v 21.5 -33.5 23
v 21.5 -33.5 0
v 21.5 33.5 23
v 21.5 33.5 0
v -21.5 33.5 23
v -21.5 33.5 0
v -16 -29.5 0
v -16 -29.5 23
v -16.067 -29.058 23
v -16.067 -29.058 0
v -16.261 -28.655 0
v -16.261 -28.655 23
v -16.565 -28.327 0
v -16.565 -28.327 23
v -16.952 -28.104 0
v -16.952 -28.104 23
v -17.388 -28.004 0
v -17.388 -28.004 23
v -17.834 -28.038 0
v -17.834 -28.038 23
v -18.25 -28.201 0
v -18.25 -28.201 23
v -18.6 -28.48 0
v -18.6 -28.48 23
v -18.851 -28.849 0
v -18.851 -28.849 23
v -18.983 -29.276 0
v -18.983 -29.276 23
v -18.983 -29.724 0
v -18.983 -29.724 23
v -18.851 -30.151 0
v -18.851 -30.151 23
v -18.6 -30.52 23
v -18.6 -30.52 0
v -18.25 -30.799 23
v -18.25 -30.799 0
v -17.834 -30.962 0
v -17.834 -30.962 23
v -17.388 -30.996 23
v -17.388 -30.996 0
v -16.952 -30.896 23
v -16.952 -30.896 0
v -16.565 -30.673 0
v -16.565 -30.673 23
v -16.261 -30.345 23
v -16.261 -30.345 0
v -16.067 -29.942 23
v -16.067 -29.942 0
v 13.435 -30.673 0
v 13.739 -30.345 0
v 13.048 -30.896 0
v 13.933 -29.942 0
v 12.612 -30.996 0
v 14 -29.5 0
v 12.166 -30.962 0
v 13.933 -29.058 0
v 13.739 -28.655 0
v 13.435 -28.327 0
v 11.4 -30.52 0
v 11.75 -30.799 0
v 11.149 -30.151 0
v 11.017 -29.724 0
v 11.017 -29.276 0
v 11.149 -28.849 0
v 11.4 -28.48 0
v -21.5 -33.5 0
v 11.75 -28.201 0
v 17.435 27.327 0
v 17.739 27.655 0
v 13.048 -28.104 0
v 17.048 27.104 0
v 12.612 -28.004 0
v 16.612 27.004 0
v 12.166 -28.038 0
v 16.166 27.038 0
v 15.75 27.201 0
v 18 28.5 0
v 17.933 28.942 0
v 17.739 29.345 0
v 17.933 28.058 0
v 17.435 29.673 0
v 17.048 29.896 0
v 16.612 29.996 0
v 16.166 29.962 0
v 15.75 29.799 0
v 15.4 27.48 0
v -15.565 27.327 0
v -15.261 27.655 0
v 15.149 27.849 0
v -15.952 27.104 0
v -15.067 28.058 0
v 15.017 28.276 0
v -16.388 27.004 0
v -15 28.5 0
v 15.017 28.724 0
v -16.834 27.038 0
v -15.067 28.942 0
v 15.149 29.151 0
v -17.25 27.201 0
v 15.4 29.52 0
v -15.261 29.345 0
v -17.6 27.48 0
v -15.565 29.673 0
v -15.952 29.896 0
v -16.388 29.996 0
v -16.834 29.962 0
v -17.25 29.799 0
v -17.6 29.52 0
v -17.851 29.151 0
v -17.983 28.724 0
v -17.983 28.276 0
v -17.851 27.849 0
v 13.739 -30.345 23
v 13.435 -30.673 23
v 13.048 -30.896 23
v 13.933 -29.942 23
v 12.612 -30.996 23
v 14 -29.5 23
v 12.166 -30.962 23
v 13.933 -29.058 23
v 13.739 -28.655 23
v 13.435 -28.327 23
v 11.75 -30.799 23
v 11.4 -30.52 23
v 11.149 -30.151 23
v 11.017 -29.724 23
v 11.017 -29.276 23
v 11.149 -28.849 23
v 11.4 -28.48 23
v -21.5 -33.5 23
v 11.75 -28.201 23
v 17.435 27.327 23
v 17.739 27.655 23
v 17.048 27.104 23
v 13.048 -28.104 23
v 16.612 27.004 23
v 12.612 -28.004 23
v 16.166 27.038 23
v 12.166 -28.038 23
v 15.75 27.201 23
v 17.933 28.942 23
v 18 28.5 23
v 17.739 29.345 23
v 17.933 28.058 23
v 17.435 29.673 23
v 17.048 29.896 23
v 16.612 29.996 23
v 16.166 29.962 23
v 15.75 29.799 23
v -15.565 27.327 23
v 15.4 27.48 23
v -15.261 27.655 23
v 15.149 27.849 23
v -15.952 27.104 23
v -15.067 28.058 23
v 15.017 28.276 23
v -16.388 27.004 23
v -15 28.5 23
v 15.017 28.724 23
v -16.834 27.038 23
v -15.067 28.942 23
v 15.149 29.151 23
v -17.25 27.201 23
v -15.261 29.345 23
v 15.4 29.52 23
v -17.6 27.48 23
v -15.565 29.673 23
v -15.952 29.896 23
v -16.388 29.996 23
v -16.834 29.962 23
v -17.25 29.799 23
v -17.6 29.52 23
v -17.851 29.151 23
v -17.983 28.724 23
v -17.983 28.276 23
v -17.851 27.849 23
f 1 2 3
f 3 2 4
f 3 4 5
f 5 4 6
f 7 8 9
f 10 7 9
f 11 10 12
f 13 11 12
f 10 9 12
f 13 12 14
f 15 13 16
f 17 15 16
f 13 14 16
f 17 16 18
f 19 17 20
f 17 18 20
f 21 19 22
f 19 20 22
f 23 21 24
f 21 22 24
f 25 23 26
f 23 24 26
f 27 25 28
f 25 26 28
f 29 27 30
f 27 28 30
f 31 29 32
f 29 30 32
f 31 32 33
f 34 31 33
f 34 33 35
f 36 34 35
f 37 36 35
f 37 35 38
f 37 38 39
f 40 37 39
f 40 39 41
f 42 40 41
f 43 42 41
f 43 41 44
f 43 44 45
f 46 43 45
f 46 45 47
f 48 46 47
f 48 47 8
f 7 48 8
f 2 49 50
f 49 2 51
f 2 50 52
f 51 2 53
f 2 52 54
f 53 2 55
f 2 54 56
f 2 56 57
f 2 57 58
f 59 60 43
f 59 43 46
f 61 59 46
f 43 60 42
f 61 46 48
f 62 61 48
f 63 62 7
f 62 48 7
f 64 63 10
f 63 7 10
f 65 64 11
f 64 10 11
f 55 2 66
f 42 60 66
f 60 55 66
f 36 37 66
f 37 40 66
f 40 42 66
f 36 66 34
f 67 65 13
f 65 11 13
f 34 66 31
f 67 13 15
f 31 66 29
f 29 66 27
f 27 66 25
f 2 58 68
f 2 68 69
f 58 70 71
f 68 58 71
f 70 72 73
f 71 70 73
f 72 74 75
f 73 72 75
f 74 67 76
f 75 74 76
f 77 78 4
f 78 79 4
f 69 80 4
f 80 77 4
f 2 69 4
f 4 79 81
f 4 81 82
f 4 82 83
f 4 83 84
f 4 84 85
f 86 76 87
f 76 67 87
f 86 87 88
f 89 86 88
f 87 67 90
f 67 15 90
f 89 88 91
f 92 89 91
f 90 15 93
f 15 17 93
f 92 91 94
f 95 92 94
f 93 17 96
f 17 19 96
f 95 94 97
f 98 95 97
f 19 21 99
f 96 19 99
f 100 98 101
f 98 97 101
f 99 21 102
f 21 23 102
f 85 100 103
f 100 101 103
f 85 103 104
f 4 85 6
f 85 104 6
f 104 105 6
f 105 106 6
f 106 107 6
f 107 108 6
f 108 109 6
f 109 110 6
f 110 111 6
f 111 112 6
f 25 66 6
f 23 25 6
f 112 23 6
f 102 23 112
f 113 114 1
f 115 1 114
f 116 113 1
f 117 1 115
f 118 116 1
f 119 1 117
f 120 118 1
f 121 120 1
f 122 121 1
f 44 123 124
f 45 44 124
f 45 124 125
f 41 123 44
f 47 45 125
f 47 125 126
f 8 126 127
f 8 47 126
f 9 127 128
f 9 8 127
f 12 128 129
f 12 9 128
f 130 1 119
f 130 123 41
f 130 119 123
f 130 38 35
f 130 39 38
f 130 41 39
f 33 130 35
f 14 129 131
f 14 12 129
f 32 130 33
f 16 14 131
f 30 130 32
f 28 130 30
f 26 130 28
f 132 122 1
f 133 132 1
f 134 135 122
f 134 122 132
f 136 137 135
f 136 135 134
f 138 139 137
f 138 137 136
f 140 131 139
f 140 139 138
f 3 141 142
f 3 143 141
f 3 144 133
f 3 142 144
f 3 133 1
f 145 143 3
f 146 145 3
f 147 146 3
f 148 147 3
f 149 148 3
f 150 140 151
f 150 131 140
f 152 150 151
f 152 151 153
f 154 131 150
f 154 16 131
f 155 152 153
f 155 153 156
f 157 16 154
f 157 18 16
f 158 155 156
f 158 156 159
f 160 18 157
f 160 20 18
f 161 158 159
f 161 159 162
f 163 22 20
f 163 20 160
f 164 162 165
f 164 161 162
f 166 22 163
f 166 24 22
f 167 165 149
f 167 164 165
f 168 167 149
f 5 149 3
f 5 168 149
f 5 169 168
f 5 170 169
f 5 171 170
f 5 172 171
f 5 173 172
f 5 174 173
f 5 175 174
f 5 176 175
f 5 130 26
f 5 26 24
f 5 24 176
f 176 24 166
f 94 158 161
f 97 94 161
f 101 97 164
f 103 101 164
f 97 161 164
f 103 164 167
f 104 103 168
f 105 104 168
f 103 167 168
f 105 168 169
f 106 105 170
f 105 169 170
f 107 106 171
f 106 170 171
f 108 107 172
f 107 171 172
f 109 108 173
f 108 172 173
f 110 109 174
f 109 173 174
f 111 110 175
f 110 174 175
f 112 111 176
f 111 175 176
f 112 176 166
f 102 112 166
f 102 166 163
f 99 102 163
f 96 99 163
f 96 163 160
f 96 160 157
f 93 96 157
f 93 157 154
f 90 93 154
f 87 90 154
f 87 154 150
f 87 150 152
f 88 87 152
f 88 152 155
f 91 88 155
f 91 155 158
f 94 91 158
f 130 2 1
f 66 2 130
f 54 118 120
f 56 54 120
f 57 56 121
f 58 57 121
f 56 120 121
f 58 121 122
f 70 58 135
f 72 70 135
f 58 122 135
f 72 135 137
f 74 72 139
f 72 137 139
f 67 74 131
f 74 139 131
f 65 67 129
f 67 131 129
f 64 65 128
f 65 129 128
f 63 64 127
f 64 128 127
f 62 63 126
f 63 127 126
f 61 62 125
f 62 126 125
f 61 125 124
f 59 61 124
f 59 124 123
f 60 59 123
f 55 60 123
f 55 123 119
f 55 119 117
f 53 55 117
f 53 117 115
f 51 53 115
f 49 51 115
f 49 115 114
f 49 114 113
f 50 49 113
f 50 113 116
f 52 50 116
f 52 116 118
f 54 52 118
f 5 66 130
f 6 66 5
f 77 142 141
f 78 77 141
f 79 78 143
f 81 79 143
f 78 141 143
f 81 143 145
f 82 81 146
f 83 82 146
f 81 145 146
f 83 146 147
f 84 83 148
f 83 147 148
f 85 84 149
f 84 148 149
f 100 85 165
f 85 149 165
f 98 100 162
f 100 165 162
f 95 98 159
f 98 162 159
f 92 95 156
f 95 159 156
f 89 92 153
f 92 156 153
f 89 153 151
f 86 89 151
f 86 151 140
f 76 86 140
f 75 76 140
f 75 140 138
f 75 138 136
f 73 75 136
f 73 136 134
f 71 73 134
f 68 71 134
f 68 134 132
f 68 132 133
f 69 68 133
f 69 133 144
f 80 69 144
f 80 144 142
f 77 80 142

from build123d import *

# Parameters (mm, degrees)
SKETCH1_W           = 67
SKETCH1_H           = 43
BOSS_EXTRUDE1_DEPTH = 23
CUT_EXTRUDE1_REACH  = 47.973
SKETCH2_R           = 1.5


with BuildPart() as part:
    # Sketch1 → Boss-Extrude1 (new body)
    with BuildSketch(Plane(origin=(0, 0, 0), x_dir=(0, 1, 0), z_dir=(0, 0, 1))):
        Rectangle(SKETCH1_W, SKETCH1_H)
    extrude(amount=BOSS_EXTRUDE1_DEPTH)

    # Sketch2 → Cut-Extrude1 (cut, up to next)
    with BuildSketch(Plane.XY.offset(23), mode=Mode.PRIVATE) as cut_extrude1_sk1:
        with Locations((-16.5, 28.5)):
            Circle(SKETCH2_R)
    cut_extrude1_tool1 = extrude(cut_extrude1_sk1.sketch, amount=-CUT_EXTRUDE1_REACH, mode=Mode.PRIVATE) & part.part
    # Sketch2 → Cut-Extrude1 (cut, up to next)
    with BuildSketch(Plane.XY.offset(23), mode=Mode.PRIVATE) as cut_extrude1_sk2:
        with Locations((16.5, 28.5)):
            Circle(SKETCH2_R)
    cut_extrude1_tool2 = extrude(cut_extrude1_sk2.sketch, amount=-CUT_EXTRUDE1_REACH, mode=Mode.PRIVATE) & part.part
    # Sketch2 → Cut-Extrude1 (cut, up to next)
    with BuildSketch(Plane.XY.offset(23), mode=Mode.PRIVATE) as cut_extrude1_sk3:
        with Locations((12.5, -29.5)):
            Circle(SKETCH2_R)
    cut_extrude1_tool3 = extrude(cut_extrude1_sk3.sketch, amount=-CUT_EXTRUDE1_REACH, mode=Mode.PRIVATE) & part.part
    # Sketch2 → Cut-Extrude1 (cut, up to next)
    with BuildSketch(Plane.XY.offset(23), mode=Mode.PRIVATE) as cut_extrude1_sk4:
        with Locations((-17.5, -29.5)):
            Circle(SKETCH2_R)
    cut_extrude1_tool4 = extrude(cut_extrude1_sk4.sketch, amount=-CUT_EXTRUDE1_REACH, mode=Mode.PRIVATE) & part.part
    add(cut_extrude1_tool1.solids().sort_by_distance((-16.5, 28.5, 23))[0], mode=Mode.SUBTRACT)
    add(cut_extrude1_tool2.solids().sort_by_distance((16.5, 28.5, 23))[0], mode=Mode.SUBTRACT)
    add(cut_extrude1_tool3.solids().sort_by_distance((12.5, -29.5, 23))[0], mode=Mode.SUBTRACT)
    add(cut_extrude1_tool4.solids().sort_by_distance((-17.5, -29.5, 23))[0], mode=Mode.SUBTRACT)


solid = part.part
